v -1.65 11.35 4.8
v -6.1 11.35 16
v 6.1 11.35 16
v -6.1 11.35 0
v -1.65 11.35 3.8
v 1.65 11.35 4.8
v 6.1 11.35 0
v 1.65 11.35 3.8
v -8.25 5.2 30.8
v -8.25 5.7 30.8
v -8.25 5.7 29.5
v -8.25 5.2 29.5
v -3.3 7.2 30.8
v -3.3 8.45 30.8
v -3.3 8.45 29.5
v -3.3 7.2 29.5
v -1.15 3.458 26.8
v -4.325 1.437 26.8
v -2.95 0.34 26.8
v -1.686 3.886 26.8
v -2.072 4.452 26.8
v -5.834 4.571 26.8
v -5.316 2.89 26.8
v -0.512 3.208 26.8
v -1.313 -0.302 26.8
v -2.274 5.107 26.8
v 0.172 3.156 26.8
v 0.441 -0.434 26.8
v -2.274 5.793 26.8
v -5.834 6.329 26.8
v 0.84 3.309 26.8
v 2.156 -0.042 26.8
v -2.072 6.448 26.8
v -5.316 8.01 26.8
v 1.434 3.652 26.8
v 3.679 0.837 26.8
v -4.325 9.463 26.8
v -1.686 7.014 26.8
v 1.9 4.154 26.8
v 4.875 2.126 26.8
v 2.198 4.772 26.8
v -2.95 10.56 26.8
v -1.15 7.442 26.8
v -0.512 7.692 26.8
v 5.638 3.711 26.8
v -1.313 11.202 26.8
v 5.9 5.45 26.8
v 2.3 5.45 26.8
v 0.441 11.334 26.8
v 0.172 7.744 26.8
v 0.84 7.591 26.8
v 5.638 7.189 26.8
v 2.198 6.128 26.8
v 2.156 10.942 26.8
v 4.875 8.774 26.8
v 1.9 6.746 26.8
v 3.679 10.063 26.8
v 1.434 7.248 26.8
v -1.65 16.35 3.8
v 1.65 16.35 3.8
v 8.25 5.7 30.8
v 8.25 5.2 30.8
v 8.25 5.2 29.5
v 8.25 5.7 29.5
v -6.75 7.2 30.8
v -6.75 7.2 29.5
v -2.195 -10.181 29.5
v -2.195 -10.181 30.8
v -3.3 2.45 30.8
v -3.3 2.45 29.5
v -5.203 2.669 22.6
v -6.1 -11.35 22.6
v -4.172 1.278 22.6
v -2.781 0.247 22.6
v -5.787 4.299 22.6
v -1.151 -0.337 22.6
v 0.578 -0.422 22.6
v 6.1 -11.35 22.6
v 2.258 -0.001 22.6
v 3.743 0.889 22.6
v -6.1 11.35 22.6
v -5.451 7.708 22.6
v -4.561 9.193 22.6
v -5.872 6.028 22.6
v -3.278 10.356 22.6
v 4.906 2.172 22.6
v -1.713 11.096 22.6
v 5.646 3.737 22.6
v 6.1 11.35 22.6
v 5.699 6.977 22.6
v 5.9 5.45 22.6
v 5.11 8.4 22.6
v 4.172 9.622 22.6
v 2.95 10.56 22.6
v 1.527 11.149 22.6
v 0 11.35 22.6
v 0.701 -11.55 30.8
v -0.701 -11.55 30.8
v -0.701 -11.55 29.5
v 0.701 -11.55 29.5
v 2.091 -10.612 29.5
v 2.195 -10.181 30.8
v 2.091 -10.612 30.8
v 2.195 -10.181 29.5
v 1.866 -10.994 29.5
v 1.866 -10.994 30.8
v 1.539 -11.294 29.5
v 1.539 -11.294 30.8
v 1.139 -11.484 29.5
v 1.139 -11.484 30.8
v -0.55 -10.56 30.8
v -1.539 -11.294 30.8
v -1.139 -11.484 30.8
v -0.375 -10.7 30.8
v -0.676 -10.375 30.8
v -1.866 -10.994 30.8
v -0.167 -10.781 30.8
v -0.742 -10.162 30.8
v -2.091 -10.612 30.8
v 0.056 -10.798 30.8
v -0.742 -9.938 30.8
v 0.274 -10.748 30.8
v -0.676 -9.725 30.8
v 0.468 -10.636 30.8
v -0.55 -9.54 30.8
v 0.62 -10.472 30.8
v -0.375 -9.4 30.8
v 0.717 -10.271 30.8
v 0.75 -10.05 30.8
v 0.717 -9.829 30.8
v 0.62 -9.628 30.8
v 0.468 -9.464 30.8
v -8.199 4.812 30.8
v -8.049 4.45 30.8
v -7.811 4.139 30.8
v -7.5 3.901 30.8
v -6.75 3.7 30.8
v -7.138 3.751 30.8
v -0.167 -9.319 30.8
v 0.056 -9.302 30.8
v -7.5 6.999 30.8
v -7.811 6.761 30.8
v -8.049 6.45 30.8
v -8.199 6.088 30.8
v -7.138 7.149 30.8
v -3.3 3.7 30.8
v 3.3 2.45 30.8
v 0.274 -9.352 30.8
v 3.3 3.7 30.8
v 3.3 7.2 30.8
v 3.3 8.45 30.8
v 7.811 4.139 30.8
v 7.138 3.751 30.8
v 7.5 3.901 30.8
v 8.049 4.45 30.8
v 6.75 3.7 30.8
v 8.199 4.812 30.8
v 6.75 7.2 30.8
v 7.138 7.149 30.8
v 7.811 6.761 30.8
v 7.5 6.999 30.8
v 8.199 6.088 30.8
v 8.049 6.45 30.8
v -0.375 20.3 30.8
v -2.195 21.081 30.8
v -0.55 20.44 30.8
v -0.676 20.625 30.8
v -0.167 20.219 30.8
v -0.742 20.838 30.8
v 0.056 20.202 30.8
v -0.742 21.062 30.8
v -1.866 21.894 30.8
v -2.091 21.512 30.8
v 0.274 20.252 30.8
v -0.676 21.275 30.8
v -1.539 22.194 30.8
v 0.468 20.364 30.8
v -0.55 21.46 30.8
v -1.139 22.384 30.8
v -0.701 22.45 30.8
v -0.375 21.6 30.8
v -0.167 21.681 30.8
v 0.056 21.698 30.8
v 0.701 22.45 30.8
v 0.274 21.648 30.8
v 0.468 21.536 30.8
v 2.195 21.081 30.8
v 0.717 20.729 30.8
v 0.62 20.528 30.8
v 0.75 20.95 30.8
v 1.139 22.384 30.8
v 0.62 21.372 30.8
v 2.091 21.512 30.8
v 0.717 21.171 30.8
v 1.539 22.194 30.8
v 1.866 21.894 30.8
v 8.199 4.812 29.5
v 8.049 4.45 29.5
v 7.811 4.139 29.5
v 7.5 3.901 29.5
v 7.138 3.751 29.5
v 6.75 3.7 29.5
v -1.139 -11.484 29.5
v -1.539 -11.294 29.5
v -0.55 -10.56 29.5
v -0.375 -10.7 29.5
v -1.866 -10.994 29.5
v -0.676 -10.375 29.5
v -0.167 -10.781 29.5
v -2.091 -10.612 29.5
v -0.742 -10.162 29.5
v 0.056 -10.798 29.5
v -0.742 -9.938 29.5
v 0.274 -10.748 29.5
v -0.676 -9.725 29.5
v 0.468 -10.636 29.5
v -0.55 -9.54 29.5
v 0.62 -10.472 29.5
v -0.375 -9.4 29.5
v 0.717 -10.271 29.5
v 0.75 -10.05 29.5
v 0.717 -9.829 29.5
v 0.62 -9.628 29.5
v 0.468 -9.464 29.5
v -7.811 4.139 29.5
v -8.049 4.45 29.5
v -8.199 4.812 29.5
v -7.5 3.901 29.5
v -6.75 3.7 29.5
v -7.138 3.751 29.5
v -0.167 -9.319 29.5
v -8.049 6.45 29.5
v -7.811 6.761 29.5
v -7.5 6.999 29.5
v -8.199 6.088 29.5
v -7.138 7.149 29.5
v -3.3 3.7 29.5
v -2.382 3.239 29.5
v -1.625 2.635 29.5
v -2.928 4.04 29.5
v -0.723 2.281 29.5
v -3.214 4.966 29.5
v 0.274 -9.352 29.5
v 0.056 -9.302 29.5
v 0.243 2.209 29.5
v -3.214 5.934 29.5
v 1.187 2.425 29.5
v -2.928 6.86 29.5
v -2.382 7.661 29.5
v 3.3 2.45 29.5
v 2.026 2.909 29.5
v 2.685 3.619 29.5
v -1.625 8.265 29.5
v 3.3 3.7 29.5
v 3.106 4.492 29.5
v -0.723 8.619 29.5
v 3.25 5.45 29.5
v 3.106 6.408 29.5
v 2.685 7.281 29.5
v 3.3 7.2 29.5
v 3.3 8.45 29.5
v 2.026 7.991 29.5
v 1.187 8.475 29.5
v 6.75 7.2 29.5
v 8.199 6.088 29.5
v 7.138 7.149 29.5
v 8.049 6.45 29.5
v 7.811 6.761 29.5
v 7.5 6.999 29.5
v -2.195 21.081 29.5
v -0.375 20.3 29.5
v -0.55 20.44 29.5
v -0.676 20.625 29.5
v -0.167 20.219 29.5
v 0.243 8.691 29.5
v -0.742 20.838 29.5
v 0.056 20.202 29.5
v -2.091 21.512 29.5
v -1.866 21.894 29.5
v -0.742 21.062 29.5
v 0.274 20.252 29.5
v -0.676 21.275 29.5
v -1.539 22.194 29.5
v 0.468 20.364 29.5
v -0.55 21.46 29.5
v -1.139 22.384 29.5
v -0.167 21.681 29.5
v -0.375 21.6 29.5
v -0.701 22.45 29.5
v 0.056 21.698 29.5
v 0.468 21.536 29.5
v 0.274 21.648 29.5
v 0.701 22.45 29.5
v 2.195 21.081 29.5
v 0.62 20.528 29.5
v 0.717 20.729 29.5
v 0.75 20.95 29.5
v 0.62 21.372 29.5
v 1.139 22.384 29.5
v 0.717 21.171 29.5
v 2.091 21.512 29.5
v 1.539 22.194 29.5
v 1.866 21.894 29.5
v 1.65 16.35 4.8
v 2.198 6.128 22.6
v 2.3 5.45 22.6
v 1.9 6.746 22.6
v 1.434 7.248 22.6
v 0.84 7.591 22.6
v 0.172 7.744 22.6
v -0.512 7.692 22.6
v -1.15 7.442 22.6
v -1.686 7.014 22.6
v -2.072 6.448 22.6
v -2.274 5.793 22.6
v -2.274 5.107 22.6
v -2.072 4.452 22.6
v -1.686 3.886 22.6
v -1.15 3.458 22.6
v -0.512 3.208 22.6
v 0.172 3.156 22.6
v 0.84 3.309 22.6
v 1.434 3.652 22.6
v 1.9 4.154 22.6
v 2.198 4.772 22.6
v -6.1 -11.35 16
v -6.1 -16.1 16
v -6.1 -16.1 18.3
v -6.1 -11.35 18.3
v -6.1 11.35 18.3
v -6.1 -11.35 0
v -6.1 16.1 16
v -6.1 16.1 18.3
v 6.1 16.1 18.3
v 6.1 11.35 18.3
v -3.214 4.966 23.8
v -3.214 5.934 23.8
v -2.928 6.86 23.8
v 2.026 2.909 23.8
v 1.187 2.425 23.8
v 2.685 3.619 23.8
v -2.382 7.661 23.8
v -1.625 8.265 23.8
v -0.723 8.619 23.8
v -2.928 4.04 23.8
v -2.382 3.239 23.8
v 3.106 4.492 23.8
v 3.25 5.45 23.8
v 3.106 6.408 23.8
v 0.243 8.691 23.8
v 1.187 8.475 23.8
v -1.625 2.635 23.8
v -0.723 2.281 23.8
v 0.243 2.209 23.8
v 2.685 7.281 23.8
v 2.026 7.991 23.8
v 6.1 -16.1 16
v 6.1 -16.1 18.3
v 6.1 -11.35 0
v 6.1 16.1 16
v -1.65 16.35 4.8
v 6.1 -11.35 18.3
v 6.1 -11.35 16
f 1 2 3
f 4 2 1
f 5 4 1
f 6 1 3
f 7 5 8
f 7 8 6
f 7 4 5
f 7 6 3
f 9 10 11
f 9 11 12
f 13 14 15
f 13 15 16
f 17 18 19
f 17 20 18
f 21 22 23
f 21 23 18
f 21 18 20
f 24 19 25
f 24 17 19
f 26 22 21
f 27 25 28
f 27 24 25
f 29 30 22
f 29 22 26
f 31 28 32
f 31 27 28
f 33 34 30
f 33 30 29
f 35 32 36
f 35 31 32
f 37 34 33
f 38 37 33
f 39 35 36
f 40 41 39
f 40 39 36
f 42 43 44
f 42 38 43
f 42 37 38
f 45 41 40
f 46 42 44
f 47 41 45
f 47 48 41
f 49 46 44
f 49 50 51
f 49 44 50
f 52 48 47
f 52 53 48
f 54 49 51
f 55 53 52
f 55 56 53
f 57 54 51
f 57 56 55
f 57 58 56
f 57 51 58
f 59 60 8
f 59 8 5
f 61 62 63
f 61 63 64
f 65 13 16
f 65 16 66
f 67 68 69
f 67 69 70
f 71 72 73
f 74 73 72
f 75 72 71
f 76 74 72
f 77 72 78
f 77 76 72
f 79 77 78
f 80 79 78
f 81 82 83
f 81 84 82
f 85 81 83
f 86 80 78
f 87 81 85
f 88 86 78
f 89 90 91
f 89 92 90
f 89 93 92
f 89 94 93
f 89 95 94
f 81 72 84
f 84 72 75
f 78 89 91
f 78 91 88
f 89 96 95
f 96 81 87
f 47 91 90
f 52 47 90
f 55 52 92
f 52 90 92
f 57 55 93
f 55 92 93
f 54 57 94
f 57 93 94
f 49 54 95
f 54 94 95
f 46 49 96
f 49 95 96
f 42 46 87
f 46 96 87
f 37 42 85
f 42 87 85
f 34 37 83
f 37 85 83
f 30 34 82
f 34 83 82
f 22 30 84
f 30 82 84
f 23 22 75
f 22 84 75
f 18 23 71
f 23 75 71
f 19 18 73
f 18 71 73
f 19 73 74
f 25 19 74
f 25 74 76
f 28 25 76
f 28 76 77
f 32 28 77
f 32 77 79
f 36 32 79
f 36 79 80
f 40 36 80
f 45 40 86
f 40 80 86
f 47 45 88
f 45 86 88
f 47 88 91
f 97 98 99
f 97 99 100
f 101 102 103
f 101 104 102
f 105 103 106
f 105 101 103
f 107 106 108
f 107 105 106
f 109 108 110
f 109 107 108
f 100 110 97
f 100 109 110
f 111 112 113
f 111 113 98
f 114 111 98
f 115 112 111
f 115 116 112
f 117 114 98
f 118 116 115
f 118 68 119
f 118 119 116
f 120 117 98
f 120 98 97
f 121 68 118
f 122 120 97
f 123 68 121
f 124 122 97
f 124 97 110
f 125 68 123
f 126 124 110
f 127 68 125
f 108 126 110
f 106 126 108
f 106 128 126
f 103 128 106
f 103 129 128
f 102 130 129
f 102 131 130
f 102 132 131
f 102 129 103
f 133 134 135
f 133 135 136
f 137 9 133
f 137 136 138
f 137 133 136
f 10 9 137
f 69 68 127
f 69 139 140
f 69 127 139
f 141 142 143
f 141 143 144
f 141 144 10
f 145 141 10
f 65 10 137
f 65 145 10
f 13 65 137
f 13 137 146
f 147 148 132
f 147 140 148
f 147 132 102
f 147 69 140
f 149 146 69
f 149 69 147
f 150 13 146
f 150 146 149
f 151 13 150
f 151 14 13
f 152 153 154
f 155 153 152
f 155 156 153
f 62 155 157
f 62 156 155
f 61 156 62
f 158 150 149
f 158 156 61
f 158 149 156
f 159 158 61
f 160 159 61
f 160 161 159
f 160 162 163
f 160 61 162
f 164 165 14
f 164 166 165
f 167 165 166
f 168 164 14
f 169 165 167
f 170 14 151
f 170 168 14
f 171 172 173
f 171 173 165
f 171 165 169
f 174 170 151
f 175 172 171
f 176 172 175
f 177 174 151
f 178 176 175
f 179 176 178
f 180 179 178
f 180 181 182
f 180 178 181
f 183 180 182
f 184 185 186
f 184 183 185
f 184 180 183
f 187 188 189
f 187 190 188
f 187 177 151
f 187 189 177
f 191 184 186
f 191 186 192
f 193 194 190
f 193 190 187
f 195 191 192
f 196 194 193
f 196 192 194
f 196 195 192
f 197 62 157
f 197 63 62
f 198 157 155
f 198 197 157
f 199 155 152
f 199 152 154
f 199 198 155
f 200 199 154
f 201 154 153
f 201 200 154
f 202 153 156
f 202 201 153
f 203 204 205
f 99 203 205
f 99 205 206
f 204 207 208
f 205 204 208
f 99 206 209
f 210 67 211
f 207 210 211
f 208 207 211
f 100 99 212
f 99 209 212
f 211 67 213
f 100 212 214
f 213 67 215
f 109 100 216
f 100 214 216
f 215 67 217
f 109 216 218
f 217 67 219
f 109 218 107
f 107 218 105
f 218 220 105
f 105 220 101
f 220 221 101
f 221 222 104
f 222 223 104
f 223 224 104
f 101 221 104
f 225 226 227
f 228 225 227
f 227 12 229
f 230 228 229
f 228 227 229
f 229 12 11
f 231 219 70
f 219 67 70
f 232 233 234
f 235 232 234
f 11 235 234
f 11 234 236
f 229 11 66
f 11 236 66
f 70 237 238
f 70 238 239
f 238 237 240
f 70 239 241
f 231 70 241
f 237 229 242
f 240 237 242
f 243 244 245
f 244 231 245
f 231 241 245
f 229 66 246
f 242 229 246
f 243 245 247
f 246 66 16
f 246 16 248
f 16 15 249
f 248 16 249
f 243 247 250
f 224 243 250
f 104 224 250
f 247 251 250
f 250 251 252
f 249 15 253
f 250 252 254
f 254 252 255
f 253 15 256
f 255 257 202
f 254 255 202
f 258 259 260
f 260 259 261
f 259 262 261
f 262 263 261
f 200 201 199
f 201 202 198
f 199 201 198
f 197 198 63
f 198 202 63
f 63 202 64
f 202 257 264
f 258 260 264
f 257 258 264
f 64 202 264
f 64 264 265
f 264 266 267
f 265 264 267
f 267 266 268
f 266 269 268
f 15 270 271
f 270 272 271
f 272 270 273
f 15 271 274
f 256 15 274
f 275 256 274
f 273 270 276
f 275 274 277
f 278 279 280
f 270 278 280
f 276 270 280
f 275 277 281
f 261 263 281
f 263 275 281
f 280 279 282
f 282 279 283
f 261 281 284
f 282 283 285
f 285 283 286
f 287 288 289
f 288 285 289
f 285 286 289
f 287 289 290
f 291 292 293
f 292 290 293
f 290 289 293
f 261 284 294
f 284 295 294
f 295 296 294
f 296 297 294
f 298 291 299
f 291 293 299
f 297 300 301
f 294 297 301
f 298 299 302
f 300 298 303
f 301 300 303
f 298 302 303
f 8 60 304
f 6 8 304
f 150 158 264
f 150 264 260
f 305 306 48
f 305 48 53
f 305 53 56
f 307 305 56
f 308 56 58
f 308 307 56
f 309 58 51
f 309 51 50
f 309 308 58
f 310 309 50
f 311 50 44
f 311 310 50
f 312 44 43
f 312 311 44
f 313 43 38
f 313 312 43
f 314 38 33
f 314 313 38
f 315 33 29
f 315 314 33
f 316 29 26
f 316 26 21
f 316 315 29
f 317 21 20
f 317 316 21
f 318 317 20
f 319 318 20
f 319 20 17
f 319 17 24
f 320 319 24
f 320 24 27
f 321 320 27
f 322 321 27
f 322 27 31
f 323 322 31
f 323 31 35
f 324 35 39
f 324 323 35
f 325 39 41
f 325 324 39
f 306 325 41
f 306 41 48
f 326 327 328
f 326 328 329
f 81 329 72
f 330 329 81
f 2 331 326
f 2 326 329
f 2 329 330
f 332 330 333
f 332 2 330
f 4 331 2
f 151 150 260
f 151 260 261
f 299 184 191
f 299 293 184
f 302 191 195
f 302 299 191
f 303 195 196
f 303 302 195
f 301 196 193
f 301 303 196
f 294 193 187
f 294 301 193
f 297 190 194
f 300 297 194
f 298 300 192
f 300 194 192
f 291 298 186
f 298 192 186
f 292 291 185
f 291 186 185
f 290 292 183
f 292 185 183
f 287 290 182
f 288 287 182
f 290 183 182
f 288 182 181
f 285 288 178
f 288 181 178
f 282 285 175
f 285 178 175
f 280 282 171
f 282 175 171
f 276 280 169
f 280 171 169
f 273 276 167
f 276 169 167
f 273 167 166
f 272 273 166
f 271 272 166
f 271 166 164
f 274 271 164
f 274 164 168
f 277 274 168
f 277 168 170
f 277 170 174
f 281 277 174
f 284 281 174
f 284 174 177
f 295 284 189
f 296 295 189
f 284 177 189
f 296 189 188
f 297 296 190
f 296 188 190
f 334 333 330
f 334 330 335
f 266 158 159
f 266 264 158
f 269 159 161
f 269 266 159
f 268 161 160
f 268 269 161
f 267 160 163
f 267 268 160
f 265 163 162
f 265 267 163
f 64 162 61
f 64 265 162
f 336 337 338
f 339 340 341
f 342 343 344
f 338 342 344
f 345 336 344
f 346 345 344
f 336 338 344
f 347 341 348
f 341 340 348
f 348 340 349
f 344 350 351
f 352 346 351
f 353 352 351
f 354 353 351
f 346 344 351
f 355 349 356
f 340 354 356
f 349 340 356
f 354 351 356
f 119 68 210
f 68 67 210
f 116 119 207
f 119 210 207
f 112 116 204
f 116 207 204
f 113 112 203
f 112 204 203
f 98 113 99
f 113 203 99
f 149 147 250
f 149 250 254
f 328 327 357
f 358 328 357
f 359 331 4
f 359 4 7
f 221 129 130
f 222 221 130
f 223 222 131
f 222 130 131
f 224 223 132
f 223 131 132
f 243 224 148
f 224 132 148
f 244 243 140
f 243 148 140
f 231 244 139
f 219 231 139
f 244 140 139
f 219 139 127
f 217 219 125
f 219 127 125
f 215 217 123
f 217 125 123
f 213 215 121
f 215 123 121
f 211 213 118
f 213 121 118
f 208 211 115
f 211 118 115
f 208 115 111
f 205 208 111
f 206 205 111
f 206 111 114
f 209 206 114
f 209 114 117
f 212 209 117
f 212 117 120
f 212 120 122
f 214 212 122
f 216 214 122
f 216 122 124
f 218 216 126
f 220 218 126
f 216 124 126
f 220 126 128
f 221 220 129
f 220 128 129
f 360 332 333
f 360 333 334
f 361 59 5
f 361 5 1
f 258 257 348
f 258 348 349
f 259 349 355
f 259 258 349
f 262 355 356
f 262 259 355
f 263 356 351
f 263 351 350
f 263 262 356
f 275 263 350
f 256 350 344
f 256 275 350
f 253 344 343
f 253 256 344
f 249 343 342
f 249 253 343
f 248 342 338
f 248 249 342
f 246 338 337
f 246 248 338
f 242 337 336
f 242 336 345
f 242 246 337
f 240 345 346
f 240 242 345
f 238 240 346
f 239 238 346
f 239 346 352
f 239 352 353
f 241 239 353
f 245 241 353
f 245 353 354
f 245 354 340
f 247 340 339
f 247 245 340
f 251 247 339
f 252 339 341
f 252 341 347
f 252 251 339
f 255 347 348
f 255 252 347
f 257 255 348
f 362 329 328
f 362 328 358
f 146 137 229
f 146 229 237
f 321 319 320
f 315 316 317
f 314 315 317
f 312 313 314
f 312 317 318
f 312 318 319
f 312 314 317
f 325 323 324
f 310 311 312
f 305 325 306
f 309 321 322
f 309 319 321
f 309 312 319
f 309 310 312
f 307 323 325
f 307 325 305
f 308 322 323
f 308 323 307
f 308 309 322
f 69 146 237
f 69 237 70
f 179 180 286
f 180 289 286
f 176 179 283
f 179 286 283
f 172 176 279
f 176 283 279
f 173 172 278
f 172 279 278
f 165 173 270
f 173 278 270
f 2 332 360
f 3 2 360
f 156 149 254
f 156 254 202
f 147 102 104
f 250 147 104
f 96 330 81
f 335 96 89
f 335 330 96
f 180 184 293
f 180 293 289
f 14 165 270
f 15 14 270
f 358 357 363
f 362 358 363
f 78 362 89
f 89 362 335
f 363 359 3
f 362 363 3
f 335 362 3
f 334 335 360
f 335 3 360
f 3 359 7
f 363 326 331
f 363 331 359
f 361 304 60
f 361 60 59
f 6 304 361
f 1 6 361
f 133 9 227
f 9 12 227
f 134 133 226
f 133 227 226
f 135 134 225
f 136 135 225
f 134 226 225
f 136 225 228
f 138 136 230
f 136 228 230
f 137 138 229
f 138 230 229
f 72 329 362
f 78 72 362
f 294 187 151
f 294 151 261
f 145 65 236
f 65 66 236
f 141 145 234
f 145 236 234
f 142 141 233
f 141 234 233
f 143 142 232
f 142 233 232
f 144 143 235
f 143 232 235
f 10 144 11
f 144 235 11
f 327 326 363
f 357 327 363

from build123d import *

# Parameters (mm, degrees)
F0_W           = 12.2
F0_H           = 22.7
F1_DEPTH       = 16
F2_W           = 12.2
F2_H           = 32.2
F3_DEPTH       = 2.3
F4_W           = 12.2
F4_H           = 22.7
F5_DEPTH       = 4.3
F6_R           = 5.9
F6_R_2         = 2.3
F7_DEPTH       = 4.2
F8_W           = 3.3
F8_H           = 1
F9_DEPTH       = 5
F10_R          = 3.25
F11_DEPTH      = 4
F11_DEPTH_BACK = 3
F12_R          = 0.75
F13_DEPTH      = 1.3
F14_SIZE2      = 1.2248412894
F14_SIZE       = 14
F14_2_SIZE2    = 1.2248412894
F14_2_SIZE     = 14
F14_3_SIZE2    = 1.2248412894
F14_3_SIZE     = 14
F15_SIZE2      = 1.2248412894
F15_SIZE       = 14
F16_R          = 1.5


with BuildPart() as f1:
    # F0 (on Top) → F1 (new body)
    with BuildSketch(Plane.XY):
        Rectangle(F0_W, F0_H)
    extrude(amount=F1_DEPTH)

    # F2 (on face) → F3 (join)
    with BuildSketch(Plane.XY.offset(16)):
        Rectangle(F2_W, F2_H)
    extrude(amount=F3_DEPTH)

    # F4 (on face) → F5 (join)
    with BuildSketch(Plane.XY.offset(18.3)):
        Rectangle(F4_W, F4_H)
    extrude(amount=F5_DEPTH)

    # F6 (on face) → F7 (join)
    with BuildSketch(Plane.XY.offset(22.6)):
        with Locations((0, 5.45)):
            Circle(F6_R)
        with Locations((0, 5.45)):
            Circle(F6_R_2, mode=Mode.SUBTRACT)
    extrude(amount=F7_DEPTH)

    # F8 (on face) → F9 (join)
    with BuildSketch(Plane(origin=(0, 11.35, 0), x_dir=(-1, 0, 0), z_dir=(0, 1, 0))):
        with Locations((0, 4.3)):
            Rectangle(F8_W, F8_H)
    extrude(amount=F9_DEPTH)


with BuildPart() as f11:
    # F10 (on face) → F11 (new body, two sides)
    with BuildSketch(Plane.XY.offset(26.8)) as f11_sk:
        with Locations((0, 5.45)):
            Circle(F10_R)
    extrude(amount=F11_DEPTH)
    extrude(f11_sk.sketch, amount=-F11_DEPTH_BACK)

    # F12 (on face) → F13 (join)
    with BuildSketch(Plane.XY.offset(30.8)):
        Polygon((3.3, 7.2), (3.3, 22.45), (-3.3, 22.45), (-3.3, 7.2), (-8.25, 7.2), (-8.25, 3.7), (-3.3, 3.7), (-3.3, -11.55), (3.3, -11.55), (3.3, 3.7), (8.25, 3.7), (8.25, 7.2), align=None)
        with Locations((0, -10.05)):
            Circle(F12_R, mode=Mode.SUBTRACT)
        with Locations((0, 20.95)):
            Circle(F12_R, mode=Mode.SUBTRACT)
    extrude(amount=-F13_DEPTH)

    # F14
    f14_edges = [f11.edges().sort_by_distance(p)[0] for p in [
        (-3.3, -11.55, 30.15),
    ]]
    f14_side = f11.faces().sort_by_distance((-3.3, -3.925, 30.15))[0]
    chamfer(f14_edges, length=F14_SIZE, length2=F14_SIZE2, reference=f14_side)

    # F14#2
    f14_2_edges = [f11.edges().sort_by_distance(p)[0] for p in [
        (3.3, -11.55, 30.15),
    ]]
    f14_2_side = f11.faces().sort_by_distance((3.3, -3.925, 30.15))[0]
    chamfer(f14_2_edges, length=F14_2_SIZE, length2=F14_2_SIZE2, reference=f14_2_side)

    # F14#3
    f14_3_edges = [f11.edges().sort_by_distance(p)[0] for p in [
        (3.3, 22.45, 30.15),
    ]]
    f14_3_side = f11.faces().sort_by_distance((3.3, 14.825, 30.15))[0]
    chamfer(f14_3_edges, length=F14_3_SIZE, length2=F14_3_SIZE2, reference=f14_3_side)

    # F15
    f15_edges = [f11.edges().sort_by_distance(p)[0] for p in [
        (-3.3, 22.45, 30.15),
    ]]
    f15_side = f11.faces().sort_by_distance((-3.3, 14.825, 30.15))[0]
    chamfer(f15_edges, length=F15_SIZE, length2=F15_SIZE2, reference=f15_side)

    # F16
    f16_edges = [f11.edges().sort_by_distance(p)[0] for p in [
        (-2.075159, 22.45, 30.15),
        (2.075159, 22.45, 30.15),
        (-8.25, 7.2, 30.15),
        (-8.25, 3.7, 30.15),
        (8.25, 7.2, 30.15),
        (8.25, 3.7, 30.15),
        (2.075159, -11.55, 30.15),
        (-2.075159, -11.55, 30.15),
    ]]
    fillet(f16_edges, radius=F16_R)


solid = Compound([f1.part, f11.part])
